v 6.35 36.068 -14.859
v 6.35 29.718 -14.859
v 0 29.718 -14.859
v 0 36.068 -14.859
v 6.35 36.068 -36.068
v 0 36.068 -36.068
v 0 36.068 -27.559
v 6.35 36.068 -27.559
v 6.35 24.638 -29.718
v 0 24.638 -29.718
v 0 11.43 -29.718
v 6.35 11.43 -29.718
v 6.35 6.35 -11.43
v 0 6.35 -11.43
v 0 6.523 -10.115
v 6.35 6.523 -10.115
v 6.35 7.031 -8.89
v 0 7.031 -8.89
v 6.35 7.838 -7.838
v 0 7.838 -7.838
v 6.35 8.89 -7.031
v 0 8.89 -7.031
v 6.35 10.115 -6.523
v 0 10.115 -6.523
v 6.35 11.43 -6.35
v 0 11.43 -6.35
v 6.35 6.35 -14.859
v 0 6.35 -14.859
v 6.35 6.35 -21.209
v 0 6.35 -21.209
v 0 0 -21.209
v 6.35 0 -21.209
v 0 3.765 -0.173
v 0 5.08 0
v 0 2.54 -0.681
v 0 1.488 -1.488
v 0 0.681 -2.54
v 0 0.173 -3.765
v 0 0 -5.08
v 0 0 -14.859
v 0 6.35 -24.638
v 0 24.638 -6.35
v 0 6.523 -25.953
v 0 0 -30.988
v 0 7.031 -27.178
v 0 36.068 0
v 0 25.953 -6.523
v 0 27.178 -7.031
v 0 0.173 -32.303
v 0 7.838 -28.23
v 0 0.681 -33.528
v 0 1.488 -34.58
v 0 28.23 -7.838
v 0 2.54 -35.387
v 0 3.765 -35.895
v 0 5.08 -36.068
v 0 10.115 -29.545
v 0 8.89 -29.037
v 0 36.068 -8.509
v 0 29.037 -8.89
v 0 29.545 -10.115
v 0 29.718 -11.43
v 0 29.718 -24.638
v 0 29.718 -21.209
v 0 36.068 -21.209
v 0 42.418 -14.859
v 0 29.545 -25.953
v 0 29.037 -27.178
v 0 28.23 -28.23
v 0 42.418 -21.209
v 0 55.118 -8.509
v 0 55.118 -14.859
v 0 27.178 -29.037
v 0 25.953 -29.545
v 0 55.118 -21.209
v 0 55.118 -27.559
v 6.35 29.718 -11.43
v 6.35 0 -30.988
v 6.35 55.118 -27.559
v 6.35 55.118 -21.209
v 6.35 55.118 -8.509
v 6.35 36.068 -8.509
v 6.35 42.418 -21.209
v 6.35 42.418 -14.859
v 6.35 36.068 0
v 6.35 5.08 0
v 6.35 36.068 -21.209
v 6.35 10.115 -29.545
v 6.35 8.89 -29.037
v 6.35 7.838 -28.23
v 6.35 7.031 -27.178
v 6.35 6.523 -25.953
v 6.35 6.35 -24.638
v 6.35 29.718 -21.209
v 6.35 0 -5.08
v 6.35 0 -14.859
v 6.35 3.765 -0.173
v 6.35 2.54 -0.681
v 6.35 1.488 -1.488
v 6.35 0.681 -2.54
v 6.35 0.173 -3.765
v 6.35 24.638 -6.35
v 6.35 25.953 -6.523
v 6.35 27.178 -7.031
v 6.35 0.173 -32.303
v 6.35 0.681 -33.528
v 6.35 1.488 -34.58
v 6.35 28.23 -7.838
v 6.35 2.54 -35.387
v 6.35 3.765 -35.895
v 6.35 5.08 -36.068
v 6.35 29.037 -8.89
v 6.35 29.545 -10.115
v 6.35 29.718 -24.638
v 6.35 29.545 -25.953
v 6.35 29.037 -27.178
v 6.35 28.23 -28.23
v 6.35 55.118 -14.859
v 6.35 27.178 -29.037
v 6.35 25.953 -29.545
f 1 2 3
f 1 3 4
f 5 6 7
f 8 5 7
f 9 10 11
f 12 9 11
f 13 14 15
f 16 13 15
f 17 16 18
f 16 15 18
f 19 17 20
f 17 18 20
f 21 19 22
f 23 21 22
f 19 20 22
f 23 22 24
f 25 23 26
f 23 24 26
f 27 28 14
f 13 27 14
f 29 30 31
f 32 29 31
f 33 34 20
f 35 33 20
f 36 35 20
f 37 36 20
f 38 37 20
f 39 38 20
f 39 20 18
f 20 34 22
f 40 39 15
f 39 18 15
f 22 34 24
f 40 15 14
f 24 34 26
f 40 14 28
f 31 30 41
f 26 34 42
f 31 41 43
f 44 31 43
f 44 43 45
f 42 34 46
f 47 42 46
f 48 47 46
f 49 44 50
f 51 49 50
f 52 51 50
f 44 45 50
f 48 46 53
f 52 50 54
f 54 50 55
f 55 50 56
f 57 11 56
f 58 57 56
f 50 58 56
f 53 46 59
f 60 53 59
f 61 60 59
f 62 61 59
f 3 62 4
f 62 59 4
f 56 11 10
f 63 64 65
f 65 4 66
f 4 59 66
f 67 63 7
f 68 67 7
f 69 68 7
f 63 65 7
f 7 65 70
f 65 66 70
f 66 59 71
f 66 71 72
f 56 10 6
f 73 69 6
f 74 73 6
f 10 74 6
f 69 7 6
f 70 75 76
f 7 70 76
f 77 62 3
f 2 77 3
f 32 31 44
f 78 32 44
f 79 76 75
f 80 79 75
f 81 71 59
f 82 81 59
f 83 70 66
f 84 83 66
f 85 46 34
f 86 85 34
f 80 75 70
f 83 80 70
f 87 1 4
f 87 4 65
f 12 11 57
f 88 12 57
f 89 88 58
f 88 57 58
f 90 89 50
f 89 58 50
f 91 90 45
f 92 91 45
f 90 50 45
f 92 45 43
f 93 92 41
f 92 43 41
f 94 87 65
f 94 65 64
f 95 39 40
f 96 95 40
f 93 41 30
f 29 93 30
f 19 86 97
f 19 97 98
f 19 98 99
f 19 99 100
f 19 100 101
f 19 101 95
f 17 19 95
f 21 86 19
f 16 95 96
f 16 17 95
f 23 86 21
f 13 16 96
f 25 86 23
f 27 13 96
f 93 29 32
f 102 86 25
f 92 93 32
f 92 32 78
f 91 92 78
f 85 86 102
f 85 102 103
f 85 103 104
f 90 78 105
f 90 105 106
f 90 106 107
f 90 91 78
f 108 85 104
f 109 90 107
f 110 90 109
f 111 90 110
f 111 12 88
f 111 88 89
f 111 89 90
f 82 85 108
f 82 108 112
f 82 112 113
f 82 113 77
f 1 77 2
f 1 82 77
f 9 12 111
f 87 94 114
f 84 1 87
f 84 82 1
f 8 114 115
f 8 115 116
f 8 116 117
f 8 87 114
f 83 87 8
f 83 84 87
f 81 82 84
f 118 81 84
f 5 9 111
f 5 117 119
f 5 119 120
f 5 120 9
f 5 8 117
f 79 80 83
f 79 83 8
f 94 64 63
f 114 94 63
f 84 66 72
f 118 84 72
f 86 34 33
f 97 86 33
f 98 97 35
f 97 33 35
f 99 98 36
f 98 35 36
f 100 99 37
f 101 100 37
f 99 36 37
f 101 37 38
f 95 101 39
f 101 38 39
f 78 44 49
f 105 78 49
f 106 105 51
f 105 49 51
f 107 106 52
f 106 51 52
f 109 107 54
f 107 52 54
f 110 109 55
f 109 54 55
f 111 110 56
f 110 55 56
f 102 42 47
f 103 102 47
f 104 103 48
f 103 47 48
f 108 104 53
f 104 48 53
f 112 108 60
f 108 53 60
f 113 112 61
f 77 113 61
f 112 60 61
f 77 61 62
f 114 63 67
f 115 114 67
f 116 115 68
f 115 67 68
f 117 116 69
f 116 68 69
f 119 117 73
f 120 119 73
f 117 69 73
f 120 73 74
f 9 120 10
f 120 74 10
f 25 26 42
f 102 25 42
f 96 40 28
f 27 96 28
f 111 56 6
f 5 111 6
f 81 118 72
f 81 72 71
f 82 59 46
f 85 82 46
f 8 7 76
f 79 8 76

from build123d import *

# Parameters (mm, degrees)
BOSS_EXTRUDE1_DEPTH = 6.35


with BuildPart() as part:
    # Sketch2 → Boss-Extrude1 (new body)
    with BuildSketch(Plane(origin=(0, 0, 0), x_dir=(0, 0, -1), z_dir=(1, 0, 0))):
        with BuildLine():
            Line((14.859, 42.418), (14.859, 55.118))
            Line((14.859, 55.118), (8.509, 55.118))
            Line((8.509, 55.118), (8.509, 36.068))
            Line((8.509, 36.068), (0, 36.068))
            Line((0, 36.068), (0, 5.08))
            ThreePointArc((0, 5.08), (1.487897552, 1.487897552), (5.08, 0))
            Line((5.08, 0), (14.859, 0))
            Line((14.859, 0), (14.859, 6.35))
            Line((14.859, 6.35), (11.43, 6.35))
            ThreePointArc((11.43, 6.35), (7.837897552, 7.837897552), (6.35, 11.43))
            Line((6.35, 11.43), (6.35, 24.638))
            ThreePointArc((6.35, 24.638), (7.837897552, 28.230102448), (11.43, 29.718))
            Line((11.43, 29.718), (14.859, 29.718))
            Line((14.859, 29.718), (14.859, 36.068))
            Line((14.859, 36.068), (21.209, 36.068))
            Line((21.209, 36.068), (21.209, 29.718))
            Line((21.209, 29.718), (24.638, 29.718))
            ThreePointArc((24.638, 29.718), (28.230102448, 28.230102448), (29.718, 24.638))
            Line((29.718, 24.638), (29.718, 11.43))
            ThreePointArc((29.718, 11.43), (28.230102448, 7.837897552), (24.638, 6.35))
            Line((24.638, 6.35), (21.209, 6.35))
            Line((21.209, 6.35), (21.209, 0))
            Line((21.209, 0), (30.988, 0))
            ThreePointArc((30.988, 0), (34.580102448, 1.487897552), (36.068, 5.08))
            Line((36.068, 5.08), (36.068, 36.068))
            Line((36.068, 36.068), (27.559, 36.068))
            Line((27.559, 36.068), (27.559, 55.118))
            Line((27.559, 55.118), (21.209, 55.118))
            Line((21.209, 55.118), (21.209, 42.418))
            Line((21.209, 42.418), (14.859, 42.418))
        make_face()
    extrude(amount=BOSS_EXTRUDE1_DEPTH)


solid = part.part
